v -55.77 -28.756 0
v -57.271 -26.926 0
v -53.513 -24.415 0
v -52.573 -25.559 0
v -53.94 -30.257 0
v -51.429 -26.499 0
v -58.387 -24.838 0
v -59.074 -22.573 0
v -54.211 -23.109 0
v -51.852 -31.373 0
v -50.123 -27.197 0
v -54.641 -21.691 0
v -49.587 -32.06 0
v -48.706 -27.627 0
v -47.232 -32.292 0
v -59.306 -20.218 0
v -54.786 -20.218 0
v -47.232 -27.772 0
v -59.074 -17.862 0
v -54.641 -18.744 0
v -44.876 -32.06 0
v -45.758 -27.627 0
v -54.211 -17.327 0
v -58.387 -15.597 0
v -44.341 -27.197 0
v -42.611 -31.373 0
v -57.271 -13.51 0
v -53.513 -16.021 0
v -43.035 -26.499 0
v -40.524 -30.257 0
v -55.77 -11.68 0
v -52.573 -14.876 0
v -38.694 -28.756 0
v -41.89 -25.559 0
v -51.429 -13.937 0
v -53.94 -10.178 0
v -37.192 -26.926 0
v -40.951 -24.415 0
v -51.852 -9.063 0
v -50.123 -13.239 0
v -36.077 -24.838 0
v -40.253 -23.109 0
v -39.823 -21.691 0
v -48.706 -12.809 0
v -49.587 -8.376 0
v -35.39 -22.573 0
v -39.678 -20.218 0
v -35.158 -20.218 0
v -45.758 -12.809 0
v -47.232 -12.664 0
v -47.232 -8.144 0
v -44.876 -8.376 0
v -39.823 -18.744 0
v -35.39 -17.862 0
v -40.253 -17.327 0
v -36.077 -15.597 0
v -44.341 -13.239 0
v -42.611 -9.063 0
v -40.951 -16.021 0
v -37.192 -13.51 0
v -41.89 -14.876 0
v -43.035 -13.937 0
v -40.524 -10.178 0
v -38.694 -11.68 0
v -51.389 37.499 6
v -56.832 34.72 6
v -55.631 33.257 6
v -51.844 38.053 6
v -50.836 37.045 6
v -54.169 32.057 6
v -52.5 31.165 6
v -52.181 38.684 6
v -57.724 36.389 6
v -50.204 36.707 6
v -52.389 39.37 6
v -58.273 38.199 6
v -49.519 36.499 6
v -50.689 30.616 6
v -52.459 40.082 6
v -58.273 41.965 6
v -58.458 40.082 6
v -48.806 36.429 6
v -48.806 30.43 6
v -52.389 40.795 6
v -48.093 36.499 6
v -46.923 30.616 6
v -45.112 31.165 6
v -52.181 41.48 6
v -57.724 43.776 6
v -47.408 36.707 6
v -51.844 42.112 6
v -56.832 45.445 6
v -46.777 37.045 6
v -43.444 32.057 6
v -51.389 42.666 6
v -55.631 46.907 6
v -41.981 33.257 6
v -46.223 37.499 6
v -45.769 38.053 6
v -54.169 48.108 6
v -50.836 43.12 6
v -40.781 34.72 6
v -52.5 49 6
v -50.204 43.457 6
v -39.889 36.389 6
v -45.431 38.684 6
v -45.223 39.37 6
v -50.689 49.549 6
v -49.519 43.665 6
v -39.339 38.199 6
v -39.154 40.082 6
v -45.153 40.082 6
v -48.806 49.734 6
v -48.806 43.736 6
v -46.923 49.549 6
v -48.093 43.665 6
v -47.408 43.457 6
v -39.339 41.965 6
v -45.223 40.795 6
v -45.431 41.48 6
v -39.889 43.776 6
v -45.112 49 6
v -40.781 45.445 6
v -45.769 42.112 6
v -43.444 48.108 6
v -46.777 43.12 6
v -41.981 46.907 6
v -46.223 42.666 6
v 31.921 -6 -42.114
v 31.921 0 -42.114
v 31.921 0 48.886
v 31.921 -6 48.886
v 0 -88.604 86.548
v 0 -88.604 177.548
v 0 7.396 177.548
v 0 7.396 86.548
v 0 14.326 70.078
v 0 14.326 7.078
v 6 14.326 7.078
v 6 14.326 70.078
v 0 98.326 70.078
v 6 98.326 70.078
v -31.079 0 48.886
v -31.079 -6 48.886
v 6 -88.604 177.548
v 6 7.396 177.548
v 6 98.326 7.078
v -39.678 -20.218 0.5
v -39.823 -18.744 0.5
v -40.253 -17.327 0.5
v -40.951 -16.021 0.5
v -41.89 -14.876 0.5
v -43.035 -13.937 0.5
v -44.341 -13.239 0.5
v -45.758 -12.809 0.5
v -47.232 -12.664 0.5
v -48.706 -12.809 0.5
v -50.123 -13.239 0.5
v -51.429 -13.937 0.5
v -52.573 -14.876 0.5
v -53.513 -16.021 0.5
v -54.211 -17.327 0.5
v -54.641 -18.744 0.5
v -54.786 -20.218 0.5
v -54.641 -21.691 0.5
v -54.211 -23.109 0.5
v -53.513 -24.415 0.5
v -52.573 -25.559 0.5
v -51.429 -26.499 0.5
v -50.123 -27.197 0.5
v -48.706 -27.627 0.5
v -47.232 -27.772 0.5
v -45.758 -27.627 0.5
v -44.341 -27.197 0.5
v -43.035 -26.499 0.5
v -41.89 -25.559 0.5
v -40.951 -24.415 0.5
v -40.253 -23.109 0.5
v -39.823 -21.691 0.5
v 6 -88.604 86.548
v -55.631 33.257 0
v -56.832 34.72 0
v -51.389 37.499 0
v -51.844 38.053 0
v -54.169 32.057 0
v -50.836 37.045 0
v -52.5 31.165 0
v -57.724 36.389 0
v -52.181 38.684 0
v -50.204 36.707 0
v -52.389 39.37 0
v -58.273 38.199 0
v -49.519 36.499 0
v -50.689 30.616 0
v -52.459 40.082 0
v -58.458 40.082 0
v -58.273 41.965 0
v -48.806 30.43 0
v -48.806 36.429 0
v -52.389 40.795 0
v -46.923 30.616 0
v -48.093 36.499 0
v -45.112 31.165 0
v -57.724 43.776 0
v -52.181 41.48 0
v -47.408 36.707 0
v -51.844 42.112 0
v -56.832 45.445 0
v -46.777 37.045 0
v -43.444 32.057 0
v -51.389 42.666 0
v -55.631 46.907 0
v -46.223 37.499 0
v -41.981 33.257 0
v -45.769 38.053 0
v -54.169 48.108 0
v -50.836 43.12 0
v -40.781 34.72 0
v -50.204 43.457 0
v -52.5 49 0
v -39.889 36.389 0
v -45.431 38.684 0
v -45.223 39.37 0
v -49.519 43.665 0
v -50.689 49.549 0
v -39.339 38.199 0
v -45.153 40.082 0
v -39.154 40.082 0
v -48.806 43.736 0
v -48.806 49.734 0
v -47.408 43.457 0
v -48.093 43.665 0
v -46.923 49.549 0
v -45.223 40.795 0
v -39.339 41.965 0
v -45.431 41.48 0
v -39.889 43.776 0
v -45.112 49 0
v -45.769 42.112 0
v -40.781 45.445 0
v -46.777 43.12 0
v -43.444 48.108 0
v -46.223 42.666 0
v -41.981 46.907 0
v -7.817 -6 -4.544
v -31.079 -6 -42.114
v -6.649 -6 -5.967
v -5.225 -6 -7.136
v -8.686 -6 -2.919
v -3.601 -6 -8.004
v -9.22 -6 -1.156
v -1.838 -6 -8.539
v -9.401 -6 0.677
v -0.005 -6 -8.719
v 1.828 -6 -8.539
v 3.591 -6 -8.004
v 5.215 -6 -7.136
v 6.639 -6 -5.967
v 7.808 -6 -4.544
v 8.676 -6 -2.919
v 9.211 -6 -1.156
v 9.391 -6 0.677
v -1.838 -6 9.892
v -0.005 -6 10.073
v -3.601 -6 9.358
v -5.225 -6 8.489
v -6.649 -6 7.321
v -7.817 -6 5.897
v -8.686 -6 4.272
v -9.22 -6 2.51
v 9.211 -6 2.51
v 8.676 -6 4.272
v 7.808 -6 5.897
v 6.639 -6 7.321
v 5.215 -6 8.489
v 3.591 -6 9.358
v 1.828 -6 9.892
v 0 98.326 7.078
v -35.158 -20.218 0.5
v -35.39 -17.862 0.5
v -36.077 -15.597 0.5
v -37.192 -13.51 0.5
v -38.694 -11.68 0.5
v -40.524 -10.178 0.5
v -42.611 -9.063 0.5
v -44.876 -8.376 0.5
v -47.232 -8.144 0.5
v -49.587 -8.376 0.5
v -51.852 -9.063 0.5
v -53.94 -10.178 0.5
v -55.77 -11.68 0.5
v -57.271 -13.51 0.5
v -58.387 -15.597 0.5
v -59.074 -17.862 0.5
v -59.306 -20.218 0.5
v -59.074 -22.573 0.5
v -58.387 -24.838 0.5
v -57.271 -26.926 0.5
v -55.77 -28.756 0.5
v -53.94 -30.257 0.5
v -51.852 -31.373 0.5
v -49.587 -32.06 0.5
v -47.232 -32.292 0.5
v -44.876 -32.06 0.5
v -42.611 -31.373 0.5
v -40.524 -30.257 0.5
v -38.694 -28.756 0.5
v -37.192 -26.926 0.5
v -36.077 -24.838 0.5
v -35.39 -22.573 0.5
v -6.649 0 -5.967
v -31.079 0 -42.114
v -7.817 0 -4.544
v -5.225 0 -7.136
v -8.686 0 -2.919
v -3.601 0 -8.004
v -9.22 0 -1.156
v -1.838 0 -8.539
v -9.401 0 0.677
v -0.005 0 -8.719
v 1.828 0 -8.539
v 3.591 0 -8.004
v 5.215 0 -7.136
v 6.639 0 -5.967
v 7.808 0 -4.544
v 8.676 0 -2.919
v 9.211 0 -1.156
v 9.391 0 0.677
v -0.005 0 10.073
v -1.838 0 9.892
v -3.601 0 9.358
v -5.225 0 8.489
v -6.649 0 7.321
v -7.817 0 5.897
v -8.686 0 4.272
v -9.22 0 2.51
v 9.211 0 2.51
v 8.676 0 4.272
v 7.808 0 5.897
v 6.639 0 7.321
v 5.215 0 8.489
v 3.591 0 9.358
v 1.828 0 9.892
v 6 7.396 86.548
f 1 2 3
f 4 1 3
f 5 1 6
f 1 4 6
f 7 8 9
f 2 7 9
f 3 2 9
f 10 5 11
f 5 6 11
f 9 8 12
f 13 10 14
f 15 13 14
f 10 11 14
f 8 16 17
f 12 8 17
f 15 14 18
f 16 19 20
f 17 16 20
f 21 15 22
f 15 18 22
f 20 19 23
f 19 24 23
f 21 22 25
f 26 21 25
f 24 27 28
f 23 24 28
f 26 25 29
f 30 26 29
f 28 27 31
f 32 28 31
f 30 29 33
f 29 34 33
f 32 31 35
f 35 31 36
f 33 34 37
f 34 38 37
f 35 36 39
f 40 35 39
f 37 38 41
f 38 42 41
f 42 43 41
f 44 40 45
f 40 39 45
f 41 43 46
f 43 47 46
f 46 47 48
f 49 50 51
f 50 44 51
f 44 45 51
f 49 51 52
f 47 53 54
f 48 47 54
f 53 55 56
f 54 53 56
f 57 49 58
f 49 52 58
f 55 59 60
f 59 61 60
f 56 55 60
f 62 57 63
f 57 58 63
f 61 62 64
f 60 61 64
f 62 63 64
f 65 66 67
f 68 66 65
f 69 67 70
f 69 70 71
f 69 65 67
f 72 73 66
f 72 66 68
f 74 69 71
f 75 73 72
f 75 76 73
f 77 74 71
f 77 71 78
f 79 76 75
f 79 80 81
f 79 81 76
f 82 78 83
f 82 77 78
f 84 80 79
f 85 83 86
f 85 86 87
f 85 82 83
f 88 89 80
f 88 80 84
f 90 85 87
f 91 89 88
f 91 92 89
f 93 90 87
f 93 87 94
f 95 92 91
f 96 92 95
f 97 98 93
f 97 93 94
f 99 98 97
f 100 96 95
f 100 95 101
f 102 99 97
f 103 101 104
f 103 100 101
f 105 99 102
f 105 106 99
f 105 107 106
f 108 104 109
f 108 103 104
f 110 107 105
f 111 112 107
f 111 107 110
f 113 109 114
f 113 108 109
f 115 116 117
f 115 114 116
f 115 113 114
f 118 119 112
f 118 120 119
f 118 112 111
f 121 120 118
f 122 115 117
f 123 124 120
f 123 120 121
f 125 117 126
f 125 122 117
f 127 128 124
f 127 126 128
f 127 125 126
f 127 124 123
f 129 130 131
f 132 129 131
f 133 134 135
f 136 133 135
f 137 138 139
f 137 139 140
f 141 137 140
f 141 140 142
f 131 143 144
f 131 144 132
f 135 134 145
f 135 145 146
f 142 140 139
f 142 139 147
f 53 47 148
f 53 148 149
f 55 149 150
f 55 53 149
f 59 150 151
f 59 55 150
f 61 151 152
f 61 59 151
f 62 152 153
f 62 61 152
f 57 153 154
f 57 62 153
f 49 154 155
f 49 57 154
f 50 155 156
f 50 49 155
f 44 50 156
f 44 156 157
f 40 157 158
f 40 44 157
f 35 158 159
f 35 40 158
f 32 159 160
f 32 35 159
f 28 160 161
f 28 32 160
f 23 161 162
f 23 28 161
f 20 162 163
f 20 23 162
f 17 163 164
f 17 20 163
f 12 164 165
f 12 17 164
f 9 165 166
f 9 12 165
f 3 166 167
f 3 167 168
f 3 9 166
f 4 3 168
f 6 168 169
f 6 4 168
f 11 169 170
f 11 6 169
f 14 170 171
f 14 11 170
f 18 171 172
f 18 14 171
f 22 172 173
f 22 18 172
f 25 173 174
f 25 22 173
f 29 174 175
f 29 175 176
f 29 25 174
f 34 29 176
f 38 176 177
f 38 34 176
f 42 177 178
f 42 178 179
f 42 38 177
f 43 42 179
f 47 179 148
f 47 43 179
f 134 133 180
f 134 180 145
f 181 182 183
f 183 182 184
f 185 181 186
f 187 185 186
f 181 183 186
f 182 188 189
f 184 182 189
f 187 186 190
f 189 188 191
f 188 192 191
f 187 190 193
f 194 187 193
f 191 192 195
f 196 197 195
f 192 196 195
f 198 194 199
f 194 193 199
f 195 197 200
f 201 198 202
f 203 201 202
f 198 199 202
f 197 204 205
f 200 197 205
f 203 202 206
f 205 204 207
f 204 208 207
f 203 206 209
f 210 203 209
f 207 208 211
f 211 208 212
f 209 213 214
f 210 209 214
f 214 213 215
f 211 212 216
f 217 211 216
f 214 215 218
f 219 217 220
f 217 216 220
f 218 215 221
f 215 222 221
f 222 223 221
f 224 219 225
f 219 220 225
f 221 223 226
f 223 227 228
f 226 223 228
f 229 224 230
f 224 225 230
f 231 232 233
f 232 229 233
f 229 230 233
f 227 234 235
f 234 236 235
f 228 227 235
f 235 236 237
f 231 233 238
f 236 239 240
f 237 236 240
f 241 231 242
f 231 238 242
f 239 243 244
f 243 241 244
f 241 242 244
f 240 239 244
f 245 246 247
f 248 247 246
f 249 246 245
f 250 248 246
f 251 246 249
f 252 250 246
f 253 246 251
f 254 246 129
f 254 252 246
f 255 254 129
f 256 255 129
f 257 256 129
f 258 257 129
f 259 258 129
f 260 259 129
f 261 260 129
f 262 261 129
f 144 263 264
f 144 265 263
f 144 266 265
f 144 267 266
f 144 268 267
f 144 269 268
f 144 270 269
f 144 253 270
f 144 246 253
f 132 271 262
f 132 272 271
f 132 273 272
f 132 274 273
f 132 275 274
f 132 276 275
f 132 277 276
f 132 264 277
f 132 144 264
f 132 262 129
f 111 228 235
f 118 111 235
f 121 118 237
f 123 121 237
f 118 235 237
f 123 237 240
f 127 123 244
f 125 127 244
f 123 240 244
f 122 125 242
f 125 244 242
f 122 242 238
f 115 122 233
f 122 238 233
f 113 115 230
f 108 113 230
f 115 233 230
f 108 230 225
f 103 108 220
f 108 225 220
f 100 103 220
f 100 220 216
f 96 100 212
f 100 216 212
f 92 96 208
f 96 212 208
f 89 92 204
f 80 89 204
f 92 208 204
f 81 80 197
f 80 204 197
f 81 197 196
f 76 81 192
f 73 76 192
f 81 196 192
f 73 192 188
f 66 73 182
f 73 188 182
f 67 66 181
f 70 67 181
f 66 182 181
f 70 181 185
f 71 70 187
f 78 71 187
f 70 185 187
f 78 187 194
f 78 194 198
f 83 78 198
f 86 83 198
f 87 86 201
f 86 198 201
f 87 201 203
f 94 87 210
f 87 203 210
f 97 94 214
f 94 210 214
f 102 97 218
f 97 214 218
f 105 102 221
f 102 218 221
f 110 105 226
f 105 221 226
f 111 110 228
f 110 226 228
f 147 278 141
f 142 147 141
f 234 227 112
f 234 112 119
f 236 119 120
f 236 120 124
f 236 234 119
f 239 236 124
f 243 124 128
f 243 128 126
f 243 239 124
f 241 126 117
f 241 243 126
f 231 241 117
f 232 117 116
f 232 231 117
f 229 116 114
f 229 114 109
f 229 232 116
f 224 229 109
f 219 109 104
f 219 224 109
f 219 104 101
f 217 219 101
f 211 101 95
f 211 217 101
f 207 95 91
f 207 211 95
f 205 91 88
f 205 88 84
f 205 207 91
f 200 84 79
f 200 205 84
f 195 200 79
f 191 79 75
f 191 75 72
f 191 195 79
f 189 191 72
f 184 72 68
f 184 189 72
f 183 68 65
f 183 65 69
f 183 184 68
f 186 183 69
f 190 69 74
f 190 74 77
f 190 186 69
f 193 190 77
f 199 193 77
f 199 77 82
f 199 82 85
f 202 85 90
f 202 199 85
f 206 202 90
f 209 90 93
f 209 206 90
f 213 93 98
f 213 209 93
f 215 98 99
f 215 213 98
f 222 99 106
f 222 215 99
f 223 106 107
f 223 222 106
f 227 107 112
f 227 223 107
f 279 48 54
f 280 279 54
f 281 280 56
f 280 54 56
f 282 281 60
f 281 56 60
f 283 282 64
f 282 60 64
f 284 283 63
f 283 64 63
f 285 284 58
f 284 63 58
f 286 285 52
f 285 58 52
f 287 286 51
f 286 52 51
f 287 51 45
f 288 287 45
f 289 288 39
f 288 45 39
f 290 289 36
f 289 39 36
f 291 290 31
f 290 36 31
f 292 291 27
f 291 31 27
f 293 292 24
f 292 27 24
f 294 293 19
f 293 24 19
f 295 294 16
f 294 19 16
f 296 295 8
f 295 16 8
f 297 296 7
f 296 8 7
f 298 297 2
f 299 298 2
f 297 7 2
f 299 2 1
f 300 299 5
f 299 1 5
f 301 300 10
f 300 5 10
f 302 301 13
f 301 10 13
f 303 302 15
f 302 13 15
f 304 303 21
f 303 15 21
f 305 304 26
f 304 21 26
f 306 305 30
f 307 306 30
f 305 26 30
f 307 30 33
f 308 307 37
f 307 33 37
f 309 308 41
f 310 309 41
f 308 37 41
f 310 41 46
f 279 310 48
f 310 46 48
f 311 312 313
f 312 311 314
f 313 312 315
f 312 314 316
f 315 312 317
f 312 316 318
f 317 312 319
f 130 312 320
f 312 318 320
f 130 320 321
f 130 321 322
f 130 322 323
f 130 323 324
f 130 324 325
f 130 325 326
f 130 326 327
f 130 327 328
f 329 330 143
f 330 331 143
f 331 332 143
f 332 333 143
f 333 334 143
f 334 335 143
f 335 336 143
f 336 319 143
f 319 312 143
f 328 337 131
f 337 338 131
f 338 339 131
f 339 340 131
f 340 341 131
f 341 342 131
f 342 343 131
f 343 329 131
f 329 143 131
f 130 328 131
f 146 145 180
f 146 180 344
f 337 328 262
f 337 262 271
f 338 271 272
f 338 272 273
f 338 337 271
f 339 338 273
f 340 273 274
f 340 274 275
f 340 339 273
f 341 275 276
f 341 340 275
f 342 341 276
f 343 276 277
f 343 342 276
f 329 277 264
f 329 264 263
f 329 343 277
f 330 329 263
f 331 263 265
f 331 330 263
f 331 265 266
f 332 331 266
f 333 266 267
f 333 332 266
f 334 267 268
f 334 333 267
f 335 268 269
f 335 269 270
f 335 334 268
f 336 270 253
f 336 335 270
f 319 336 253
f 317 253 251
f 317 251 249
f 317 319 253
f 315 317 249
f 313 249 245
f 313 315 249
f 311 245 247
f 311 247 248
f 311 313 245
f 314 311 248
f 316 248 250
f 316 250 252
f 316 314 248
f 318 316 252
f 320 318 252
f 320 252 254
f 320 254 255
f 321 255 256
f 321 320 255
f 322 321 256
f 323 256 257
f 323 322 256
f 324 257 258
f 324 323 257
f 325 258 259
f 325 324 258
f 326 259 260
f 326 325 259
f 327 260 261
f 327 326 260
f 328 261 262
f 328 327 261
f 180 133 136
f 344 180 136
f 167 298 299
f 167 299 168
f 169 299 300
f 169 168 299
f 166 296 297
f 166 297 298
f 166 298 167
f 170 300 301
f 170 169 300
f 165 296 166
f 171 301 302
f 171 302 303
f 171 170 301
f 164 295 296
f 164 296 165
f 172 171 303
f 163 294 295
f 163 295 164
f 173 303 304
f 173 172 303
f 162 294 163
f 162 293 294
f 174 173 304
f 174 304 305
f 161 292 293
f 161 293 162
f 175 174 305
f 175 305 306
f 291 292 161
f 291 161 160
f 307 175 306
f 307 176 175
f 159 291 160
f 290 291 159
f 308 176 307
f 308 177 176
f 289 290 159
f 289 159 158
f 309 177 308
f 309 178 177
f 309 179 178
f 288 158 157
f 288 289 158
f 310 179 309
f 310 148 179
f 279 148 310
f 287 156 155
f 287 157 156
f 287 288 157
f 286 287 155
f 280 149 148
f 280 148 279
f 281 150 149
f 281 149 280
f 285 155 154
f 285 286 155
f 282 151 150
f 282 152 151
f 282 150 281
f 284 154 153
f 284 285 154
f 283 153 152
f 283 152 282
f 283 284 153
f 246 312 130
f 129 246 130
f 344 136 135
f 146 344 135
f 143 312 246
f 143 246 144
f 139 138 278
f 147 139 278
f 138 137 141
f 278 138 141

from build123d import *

# Parameters (mm, degrees)
F0_W     = 63
F0_H     = 91
F0_R     = 9.39616
F1_DEPTH = 6
F2_W     = 96
F2_H     = 91
F3_DEPTH = 6
F4_R     = 9.652158
F4_R_2   = 3.653207
F5_DEPTH = 6
F6_W     = 84
F6_H     = 63
F7_DEPTH = 6
F8_R     = 12.074279
F8_R_2   = 7.553901
F9_DEPTH = 0.5


with BuildPart() as f1:
    # F0 (on Front) → F1 (new body)
    with BuildSketch(Plane.XZ):
        with Locations((0.421124, 3.386388)):
            Rectangle(F0_W, F0_H)
        with Locations((-0.004797, 0.676707)):
            Circle(F0_R, mode=Mode.SUBTRACT)
    extrude(amount=F1_DEPTH)


with BuildPart() as f3:
    # F2 (on Right) → F3 (new body)
    with BuildSketch(Plane.YZ):
        with Locations((-40.603922, 132.048147)):
            Rectangle(F2_W, F2_H)
    extrude(amount=F3_DEPTH)


with BuildPart() as f5:
    # F4 (on Top) → F5 (new body)
    with BuildSketch(Plane.XY):
        with Locations((-48.806142, 40.082339)):
            Circle(F4_R)
        with Locations((-48.806142, 40.082339)):
            Circle(F4_R_2, mode=Mode.SUBTRACT)
    extrude(amount=F5_DEPTH)


with BuildPart() as f7:
    # F6 (on Right) → F7 (new body)
    with BuildSketch(Plane.YZ):
        with Locations((56.326499, 38.57775)):
            Rectangle(F6_W, F6_H)
    extrude(amount=F7_DEPTH)


with BuildPart() as f9:
    # F8 (on Top) → F9 (new body)
    with BuildSketch(Plane.XY):
        with Locations((-47.231812, -20.217795)):
            Circle(F8_R)
        with Locations((-47.231812, -20.217795)):
            Circle(F8_R_2, mode=Mode.SUBTRACT)
    extrude(amount=F9_DEPTH)


solid = Compound([f1.part, f3.part, f5.part, f7.part, f9.part])
